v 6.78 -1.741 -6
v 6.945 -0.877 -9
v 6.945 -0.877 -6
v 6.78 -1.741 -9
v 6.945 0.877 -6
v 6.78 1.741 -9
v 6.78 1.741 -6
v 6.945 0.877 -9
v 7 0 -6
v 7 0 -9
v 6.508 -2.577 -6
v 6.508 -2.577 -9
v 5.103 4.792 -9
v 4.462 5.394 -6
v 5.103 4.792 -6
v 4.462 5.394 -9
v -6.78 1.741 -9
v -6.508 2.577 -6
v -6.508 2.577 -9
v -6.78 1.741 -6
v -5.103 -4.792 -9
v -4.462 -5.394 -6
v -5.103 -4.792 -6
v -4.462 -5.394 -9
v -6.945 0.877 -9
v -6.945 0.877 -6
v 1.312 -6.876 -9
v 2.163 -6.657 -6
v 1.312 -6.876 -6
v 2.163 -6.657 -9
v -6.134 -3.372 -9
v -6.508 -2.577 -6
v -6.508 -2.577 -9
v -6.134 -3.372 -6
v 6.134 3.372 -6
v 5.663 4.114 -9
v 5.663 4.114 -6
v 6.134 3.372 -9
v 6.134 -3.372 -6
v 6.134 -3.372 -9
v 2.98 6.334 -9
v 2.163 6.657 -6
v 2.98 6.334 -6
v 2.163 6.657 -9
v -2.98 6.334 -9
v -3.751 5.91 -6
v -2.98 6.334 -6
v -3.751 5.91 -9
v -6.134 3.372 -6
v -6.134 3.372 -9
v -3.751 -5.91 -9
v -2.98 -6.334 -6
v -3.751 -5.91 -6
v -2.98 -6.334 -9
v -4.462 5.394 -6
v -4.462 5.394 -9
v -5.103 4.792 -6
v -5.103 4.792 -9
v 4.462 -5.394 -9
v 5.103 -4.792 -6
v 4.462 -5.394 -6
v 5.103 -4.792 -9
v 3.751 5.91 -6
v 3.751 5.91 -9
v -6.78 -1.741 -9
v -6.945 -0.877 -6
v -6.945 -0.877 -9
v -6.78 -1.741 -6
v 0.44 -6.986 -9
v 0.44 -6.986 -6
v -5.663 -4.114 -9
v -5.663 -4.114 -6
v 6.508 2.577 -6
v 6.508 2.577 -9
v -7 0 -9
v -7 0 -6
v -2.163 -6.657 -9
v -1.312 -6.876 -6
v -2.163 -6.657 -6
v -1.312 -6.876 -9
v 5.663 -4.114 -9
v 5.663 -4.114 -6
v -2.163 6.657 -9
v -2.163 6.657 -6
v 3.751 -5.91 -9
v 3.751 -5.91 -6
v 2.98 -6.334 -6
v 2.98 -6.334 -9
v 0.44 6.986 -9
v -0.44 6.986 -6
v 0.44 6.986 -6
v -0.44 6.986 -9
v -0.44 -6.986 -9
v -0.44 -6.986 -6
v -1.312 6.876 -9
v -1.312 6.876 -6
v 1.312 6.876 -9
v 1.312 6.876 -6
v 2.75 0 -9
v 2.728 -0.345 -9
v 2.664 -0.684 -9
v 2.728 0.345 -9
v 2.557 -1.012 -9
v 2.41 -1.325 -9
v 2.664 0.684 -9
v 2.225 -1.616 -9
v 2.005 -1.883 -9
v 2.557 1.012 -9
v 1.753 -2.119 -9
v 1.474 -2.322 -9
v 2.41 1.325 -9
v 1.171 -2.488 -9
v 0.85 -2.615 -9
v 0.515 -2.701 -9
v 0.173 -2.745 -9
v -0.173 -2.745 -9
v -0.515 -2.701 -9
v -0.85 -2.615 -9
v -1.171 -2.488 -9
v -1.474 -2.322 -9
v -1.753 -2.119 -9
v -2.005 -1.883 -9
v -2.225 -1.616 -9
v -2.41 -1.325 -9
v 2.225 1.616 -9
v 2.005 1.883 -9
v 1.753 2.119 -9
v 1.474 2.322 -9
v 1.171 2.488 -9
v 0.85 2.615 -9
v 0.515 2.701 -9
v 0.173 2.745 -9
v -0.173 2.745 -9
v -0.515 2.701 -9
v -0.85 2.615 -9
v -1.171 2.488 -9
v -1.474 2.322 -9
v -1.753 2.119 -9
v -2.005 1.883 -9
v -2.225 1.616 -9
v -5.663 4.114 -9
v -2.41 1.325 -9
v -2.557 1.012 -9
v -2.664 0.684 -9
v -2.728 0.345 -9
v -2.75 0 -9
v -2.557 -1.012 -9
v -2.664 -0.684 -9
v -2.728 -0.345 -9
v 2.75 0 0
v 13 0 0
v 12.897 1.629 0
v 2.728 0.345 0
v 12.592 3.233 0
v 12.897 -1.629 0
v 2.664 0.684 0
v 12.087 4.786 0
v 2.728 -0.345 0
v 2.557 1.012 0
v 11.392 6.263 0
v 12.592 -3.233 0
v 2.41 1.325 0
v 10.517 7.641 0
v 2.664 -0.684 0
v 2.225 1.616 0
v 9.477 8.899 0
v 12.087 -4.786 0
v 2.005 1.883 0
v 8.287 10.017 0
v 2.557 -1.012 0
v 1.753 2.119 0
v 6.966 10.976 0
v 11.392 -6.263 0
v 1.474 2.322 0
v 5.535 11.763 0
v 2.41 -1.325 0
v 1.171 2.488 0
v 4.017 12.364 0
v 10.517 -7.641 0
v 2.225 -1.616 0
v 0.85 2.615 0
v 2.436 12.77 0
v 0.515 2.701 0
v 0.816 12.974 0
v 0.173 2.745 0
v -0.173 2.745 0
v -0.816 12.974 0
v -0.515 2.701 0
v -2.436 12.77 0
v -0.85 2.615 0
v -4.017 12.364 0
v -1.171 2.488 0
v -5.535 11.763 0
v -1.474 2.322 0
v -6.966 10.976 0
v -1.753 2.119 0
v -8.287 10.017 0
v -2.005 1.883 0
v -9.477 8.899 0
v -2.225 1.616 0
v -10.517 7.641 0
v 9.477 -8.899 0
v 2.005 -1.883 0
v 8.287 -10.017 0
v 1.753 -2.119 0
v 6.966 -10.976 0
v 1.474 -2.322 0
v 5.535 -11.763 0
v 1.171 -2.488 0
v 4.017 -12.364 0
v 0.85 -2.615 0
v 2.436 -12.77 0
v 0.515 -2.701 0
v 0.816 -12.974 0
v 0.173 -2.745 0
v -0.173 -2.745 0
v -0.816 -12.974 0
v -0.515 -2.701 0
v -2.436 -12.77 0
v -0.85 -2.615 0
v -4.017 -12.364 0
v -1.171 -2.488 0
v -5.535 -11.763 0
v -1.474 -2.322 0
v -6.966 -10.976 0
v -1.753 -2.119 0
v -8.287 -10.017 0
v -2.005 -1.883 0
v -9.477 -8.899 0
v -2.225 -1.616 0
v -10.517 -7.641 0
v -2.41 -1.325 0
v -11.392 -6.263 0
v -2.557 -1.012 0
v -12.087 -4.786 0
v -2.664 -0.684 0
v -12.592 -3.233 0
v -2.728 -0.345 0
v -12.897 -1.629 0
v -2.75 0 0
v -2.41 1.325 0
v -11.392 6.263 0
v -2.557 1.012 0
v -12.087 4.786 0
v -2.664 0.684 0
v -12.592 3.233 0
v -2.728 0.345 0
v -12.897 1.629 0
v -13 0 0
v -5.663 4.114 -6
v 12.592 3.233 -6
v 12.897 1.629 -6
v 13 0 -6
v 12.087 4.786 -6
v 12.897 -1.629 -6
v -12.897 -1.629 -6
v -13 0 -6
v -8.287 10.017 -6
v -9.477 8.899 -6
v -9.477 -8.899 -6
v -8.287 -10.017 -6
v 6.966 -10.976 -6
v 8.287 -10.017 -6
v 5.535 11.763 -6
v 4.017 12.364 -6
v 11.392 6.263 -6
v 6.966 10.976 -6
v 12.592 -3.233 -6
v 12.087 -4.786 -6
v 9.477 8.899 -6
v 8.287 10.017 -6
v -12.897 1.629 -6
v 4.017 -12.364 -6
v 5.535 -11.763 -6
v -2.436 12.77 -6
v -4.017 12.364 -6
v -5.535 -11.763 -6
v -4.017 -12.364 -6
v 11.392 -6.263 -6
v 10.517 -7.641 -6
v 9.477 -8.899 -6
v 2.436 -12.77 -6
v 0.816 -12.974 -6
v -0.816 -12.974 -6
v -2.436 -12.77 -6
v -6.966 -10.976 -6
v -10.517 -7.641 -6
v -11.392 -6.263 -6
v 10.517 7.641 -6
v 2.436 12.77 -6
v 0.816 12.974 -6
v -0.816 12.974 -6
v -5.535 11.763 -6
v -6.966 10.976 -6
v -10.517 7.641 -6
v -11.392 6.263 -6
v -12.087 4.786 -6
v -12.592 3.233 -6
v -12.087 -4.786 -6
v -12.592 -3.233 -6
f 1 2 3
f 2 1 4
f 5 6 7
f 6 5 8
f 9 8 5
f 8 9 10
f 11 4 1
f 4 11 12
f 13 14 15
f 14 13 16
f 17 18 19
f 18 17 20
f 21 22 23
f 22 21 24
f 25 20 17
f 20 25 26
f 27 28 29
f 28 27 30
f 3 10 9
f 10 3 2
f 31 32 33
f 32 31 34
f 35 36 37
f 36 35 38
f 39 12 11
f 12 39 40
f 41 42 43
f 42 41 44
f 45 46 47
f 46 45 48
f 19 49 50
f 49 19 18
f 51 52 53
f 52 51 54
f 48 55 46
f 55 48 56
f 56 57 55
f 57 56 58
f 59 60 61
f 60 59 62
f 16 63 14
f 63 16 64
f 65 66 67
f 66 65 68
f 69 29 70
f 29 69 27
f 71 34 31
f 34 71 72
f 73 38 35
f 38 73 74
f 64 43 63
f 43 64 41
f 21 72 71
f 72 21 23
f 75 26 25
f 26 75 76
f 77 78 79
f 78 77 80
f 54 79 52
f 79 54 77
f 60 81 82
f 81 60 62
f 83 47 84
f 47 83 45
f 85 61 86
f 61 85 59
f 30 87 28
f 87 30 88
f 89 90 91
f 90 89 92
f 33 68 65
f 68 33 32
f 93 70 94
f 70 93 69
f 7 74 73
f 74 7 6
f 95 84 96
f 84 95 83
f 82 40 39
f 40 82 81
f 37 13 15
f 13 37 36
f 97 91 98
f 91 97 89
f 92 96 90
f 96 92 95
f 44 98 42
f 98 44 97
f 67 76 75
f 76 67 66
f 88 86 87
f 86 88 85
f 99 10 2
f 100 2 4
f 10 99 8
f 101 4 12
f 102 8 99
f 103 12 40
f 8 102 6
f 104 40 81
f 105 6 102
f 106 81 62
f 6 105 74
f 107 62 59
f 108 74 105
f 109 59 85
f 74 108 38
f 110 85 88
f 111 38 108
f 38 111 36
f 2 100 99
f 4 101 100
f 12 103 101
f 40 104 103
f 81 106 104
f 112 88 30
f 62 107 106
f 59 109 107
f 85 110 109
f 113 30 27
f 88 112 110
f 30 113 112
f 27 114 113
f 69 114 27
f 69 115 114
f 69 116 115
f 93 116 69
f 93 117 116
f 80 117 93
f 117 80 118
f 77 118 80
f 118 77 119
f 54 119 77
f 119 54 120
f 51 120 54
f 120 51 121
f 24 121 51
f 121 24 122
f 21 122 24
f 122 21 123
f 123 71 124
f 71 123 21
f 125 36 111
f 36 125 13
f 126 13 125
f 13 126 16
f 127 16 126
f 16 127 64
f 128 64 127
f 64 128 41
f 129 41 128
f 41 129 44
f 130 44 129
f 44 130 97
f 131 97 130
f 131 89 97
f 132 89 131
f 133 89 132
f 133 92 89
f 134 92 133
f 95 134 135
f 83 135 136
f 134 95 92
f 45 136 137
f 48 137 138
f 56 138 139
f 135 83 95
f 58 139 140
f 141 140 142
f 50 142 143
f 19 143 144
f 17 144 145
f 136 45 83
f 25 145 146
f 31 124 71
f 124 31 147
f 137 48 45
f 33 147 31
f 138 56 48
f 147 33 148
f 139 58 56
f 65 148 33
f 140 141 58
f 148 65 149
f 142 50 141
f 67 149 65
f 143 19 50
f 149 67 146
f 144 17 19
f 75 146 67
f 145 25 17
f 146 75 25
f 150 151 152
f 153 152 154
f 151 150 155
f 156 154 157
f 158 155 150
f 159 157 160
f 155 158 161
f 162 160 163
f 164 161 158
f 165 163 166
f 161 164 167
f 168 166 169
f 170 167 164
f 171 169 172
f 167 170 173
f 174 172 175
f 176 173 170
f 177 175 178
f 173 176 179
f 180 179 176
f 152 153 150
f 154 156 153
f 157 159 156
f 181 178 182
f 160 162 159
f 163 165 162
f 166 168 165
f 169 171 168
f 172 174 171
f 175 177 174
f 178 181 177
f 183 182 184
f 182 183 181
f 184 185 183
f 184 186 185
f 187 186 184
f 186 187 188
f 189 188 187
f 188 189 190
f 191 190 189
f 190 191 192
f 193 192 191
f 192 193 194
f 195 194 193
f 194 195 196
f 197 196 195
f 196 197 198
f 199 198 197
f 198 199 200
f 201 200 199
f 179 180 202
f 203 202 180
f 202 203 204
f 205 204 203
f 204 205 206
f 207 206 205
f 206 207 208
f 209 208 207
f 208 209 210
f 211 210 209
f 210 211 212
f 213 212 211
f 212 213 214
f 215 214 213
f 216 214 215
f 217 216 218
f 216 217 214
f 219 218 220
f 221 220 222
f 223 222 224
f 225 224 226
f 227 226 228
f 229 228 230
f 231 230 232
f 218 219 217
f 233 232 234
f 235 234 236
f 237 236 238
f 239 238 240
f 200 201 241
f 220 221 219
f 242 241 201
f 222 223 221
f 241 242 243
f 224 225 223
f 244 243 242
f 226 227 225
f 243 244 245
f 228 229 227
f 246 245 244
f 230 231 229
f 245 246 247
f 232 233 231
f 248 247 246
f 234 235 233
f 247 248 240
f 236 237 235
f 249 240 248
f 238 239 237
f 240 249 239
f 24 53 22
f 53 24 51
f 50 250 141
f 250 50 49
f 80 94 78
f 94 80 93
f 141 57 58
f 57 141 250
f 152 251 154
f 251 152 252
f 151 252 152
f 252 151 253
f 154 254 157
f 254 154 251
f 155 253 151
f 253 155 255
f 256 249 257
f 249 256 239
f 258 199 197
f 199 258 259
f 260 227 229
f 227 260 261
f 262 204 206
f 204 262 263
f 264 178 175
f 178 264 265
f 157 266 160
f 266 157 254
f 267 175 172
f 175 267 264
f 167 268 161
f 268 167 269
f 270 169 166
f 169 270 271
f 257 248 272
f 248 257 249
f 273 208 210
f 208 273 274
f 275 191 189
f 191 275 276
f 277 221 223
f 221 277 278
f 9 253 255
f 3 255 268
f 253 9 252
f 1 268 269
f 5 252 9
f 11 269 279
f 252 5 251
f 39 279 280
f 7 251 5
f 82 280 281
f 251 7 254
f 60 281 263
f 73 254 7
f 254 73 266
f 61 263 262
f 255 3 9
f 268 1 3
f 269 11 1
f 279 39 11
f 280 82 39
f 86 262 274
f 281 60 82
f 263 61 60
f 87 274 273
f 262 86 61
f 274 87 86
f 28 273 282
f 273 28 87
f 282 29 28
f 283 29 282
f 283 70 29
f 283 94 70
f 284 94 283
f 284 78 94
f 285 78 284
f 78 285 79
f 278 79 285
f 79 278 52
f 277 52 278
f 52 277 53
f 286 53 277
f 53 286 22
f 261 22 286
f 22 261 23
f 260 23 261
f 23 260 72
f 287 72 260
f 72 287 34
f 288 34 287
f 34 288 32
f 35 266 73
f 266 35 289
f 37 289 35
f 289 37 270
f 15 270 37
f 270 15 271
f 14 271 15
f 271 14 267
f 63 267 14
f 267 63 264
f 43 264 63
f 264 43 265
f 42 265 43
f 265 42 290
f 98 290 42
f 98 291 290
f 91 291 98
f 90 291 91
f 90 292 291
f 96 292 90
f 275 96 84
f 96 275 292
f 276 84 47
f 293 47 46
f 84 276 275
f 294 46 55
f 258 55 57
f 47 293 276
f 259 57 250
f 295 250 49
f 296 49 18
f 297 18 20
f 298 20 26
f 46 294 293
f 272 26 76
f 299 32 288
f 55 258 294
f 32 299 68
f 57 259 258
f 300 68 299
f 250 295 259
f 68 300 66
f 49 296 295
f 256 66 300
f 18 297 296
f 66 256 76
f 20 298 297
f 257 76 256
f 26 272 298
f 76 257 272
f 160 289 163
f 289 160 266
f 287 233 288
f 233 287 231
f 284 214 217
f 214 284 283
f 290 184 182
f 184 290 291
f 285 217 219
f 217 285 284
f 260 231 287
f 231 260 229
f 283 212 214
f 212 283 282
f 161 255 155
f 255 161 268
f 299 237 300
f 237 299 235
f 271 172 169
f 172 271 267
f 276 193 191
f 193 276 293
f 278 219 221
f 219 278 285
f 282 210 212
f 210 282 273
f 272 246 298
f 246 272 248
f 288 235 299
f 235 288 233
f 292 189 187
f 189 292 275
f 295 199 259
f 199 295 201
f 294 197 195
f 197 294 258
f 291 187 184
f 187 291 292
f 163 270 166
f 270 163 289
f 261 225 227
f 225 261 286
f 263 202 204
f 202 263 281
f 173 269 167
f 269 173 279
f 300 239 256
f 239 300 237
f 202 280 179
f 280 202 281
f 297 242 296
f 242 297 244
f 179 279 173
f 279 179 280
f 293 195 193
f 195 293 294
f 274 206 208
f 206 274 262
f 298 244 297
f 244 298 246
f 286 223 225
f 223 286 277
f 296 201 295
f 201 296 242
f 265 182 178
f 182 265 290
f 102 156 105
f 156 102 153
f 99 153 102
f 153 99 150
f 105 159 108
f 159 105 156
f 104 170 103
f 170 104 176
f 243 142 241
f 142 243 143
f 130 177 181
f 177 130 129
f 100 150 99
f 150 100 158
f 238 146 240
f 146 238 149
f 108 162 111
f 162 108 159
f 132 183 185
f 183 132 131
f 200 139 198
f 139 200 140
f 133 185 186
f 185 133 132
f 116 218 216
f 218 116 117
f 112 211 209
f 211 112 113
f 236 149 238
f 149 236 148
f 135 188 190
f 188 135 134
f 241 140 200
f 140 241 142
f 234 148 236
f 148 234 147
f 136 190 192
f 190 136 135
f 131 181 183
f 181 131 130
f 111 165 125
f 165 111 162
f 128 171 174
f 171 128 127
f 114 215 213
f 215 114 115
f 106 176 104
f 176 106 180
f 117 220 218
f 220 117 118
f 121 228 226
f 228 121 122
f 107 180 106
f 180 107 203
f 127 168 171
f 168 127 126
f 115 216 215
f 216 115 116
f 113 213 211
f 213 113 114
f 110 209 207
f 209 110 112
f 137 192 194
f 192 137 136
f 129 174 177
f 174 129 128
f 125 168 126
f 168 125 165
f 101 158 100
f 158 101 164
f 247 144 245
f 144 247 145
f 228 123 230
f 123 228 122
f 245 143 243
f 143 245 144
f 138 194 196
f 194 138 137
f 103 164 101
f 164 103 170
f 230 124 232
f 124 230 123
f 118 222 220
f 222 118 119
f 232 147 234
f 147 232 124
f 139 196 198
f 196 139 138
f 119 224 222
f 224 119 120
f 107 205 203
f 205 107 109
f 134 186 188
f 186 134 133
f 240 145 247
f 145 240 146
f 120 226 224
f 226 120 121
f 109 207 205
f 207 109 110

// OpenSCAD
$fn = 50;


difference() {
	union() {
		translate(v = [0, 0, -9.0000000000]) {
			cylinder(h = 9, r = 7.0000000000);
		}
		translate(v = [0, 0, -6.0000000000]) {
			cylinder(h = 6, r = 13.0000000000);
		}
	}
	union() {
		#translate(v = [0, 0, -9]) {
			cylinder(h = 9, r = 2.7500000000);
		}
	}
}
